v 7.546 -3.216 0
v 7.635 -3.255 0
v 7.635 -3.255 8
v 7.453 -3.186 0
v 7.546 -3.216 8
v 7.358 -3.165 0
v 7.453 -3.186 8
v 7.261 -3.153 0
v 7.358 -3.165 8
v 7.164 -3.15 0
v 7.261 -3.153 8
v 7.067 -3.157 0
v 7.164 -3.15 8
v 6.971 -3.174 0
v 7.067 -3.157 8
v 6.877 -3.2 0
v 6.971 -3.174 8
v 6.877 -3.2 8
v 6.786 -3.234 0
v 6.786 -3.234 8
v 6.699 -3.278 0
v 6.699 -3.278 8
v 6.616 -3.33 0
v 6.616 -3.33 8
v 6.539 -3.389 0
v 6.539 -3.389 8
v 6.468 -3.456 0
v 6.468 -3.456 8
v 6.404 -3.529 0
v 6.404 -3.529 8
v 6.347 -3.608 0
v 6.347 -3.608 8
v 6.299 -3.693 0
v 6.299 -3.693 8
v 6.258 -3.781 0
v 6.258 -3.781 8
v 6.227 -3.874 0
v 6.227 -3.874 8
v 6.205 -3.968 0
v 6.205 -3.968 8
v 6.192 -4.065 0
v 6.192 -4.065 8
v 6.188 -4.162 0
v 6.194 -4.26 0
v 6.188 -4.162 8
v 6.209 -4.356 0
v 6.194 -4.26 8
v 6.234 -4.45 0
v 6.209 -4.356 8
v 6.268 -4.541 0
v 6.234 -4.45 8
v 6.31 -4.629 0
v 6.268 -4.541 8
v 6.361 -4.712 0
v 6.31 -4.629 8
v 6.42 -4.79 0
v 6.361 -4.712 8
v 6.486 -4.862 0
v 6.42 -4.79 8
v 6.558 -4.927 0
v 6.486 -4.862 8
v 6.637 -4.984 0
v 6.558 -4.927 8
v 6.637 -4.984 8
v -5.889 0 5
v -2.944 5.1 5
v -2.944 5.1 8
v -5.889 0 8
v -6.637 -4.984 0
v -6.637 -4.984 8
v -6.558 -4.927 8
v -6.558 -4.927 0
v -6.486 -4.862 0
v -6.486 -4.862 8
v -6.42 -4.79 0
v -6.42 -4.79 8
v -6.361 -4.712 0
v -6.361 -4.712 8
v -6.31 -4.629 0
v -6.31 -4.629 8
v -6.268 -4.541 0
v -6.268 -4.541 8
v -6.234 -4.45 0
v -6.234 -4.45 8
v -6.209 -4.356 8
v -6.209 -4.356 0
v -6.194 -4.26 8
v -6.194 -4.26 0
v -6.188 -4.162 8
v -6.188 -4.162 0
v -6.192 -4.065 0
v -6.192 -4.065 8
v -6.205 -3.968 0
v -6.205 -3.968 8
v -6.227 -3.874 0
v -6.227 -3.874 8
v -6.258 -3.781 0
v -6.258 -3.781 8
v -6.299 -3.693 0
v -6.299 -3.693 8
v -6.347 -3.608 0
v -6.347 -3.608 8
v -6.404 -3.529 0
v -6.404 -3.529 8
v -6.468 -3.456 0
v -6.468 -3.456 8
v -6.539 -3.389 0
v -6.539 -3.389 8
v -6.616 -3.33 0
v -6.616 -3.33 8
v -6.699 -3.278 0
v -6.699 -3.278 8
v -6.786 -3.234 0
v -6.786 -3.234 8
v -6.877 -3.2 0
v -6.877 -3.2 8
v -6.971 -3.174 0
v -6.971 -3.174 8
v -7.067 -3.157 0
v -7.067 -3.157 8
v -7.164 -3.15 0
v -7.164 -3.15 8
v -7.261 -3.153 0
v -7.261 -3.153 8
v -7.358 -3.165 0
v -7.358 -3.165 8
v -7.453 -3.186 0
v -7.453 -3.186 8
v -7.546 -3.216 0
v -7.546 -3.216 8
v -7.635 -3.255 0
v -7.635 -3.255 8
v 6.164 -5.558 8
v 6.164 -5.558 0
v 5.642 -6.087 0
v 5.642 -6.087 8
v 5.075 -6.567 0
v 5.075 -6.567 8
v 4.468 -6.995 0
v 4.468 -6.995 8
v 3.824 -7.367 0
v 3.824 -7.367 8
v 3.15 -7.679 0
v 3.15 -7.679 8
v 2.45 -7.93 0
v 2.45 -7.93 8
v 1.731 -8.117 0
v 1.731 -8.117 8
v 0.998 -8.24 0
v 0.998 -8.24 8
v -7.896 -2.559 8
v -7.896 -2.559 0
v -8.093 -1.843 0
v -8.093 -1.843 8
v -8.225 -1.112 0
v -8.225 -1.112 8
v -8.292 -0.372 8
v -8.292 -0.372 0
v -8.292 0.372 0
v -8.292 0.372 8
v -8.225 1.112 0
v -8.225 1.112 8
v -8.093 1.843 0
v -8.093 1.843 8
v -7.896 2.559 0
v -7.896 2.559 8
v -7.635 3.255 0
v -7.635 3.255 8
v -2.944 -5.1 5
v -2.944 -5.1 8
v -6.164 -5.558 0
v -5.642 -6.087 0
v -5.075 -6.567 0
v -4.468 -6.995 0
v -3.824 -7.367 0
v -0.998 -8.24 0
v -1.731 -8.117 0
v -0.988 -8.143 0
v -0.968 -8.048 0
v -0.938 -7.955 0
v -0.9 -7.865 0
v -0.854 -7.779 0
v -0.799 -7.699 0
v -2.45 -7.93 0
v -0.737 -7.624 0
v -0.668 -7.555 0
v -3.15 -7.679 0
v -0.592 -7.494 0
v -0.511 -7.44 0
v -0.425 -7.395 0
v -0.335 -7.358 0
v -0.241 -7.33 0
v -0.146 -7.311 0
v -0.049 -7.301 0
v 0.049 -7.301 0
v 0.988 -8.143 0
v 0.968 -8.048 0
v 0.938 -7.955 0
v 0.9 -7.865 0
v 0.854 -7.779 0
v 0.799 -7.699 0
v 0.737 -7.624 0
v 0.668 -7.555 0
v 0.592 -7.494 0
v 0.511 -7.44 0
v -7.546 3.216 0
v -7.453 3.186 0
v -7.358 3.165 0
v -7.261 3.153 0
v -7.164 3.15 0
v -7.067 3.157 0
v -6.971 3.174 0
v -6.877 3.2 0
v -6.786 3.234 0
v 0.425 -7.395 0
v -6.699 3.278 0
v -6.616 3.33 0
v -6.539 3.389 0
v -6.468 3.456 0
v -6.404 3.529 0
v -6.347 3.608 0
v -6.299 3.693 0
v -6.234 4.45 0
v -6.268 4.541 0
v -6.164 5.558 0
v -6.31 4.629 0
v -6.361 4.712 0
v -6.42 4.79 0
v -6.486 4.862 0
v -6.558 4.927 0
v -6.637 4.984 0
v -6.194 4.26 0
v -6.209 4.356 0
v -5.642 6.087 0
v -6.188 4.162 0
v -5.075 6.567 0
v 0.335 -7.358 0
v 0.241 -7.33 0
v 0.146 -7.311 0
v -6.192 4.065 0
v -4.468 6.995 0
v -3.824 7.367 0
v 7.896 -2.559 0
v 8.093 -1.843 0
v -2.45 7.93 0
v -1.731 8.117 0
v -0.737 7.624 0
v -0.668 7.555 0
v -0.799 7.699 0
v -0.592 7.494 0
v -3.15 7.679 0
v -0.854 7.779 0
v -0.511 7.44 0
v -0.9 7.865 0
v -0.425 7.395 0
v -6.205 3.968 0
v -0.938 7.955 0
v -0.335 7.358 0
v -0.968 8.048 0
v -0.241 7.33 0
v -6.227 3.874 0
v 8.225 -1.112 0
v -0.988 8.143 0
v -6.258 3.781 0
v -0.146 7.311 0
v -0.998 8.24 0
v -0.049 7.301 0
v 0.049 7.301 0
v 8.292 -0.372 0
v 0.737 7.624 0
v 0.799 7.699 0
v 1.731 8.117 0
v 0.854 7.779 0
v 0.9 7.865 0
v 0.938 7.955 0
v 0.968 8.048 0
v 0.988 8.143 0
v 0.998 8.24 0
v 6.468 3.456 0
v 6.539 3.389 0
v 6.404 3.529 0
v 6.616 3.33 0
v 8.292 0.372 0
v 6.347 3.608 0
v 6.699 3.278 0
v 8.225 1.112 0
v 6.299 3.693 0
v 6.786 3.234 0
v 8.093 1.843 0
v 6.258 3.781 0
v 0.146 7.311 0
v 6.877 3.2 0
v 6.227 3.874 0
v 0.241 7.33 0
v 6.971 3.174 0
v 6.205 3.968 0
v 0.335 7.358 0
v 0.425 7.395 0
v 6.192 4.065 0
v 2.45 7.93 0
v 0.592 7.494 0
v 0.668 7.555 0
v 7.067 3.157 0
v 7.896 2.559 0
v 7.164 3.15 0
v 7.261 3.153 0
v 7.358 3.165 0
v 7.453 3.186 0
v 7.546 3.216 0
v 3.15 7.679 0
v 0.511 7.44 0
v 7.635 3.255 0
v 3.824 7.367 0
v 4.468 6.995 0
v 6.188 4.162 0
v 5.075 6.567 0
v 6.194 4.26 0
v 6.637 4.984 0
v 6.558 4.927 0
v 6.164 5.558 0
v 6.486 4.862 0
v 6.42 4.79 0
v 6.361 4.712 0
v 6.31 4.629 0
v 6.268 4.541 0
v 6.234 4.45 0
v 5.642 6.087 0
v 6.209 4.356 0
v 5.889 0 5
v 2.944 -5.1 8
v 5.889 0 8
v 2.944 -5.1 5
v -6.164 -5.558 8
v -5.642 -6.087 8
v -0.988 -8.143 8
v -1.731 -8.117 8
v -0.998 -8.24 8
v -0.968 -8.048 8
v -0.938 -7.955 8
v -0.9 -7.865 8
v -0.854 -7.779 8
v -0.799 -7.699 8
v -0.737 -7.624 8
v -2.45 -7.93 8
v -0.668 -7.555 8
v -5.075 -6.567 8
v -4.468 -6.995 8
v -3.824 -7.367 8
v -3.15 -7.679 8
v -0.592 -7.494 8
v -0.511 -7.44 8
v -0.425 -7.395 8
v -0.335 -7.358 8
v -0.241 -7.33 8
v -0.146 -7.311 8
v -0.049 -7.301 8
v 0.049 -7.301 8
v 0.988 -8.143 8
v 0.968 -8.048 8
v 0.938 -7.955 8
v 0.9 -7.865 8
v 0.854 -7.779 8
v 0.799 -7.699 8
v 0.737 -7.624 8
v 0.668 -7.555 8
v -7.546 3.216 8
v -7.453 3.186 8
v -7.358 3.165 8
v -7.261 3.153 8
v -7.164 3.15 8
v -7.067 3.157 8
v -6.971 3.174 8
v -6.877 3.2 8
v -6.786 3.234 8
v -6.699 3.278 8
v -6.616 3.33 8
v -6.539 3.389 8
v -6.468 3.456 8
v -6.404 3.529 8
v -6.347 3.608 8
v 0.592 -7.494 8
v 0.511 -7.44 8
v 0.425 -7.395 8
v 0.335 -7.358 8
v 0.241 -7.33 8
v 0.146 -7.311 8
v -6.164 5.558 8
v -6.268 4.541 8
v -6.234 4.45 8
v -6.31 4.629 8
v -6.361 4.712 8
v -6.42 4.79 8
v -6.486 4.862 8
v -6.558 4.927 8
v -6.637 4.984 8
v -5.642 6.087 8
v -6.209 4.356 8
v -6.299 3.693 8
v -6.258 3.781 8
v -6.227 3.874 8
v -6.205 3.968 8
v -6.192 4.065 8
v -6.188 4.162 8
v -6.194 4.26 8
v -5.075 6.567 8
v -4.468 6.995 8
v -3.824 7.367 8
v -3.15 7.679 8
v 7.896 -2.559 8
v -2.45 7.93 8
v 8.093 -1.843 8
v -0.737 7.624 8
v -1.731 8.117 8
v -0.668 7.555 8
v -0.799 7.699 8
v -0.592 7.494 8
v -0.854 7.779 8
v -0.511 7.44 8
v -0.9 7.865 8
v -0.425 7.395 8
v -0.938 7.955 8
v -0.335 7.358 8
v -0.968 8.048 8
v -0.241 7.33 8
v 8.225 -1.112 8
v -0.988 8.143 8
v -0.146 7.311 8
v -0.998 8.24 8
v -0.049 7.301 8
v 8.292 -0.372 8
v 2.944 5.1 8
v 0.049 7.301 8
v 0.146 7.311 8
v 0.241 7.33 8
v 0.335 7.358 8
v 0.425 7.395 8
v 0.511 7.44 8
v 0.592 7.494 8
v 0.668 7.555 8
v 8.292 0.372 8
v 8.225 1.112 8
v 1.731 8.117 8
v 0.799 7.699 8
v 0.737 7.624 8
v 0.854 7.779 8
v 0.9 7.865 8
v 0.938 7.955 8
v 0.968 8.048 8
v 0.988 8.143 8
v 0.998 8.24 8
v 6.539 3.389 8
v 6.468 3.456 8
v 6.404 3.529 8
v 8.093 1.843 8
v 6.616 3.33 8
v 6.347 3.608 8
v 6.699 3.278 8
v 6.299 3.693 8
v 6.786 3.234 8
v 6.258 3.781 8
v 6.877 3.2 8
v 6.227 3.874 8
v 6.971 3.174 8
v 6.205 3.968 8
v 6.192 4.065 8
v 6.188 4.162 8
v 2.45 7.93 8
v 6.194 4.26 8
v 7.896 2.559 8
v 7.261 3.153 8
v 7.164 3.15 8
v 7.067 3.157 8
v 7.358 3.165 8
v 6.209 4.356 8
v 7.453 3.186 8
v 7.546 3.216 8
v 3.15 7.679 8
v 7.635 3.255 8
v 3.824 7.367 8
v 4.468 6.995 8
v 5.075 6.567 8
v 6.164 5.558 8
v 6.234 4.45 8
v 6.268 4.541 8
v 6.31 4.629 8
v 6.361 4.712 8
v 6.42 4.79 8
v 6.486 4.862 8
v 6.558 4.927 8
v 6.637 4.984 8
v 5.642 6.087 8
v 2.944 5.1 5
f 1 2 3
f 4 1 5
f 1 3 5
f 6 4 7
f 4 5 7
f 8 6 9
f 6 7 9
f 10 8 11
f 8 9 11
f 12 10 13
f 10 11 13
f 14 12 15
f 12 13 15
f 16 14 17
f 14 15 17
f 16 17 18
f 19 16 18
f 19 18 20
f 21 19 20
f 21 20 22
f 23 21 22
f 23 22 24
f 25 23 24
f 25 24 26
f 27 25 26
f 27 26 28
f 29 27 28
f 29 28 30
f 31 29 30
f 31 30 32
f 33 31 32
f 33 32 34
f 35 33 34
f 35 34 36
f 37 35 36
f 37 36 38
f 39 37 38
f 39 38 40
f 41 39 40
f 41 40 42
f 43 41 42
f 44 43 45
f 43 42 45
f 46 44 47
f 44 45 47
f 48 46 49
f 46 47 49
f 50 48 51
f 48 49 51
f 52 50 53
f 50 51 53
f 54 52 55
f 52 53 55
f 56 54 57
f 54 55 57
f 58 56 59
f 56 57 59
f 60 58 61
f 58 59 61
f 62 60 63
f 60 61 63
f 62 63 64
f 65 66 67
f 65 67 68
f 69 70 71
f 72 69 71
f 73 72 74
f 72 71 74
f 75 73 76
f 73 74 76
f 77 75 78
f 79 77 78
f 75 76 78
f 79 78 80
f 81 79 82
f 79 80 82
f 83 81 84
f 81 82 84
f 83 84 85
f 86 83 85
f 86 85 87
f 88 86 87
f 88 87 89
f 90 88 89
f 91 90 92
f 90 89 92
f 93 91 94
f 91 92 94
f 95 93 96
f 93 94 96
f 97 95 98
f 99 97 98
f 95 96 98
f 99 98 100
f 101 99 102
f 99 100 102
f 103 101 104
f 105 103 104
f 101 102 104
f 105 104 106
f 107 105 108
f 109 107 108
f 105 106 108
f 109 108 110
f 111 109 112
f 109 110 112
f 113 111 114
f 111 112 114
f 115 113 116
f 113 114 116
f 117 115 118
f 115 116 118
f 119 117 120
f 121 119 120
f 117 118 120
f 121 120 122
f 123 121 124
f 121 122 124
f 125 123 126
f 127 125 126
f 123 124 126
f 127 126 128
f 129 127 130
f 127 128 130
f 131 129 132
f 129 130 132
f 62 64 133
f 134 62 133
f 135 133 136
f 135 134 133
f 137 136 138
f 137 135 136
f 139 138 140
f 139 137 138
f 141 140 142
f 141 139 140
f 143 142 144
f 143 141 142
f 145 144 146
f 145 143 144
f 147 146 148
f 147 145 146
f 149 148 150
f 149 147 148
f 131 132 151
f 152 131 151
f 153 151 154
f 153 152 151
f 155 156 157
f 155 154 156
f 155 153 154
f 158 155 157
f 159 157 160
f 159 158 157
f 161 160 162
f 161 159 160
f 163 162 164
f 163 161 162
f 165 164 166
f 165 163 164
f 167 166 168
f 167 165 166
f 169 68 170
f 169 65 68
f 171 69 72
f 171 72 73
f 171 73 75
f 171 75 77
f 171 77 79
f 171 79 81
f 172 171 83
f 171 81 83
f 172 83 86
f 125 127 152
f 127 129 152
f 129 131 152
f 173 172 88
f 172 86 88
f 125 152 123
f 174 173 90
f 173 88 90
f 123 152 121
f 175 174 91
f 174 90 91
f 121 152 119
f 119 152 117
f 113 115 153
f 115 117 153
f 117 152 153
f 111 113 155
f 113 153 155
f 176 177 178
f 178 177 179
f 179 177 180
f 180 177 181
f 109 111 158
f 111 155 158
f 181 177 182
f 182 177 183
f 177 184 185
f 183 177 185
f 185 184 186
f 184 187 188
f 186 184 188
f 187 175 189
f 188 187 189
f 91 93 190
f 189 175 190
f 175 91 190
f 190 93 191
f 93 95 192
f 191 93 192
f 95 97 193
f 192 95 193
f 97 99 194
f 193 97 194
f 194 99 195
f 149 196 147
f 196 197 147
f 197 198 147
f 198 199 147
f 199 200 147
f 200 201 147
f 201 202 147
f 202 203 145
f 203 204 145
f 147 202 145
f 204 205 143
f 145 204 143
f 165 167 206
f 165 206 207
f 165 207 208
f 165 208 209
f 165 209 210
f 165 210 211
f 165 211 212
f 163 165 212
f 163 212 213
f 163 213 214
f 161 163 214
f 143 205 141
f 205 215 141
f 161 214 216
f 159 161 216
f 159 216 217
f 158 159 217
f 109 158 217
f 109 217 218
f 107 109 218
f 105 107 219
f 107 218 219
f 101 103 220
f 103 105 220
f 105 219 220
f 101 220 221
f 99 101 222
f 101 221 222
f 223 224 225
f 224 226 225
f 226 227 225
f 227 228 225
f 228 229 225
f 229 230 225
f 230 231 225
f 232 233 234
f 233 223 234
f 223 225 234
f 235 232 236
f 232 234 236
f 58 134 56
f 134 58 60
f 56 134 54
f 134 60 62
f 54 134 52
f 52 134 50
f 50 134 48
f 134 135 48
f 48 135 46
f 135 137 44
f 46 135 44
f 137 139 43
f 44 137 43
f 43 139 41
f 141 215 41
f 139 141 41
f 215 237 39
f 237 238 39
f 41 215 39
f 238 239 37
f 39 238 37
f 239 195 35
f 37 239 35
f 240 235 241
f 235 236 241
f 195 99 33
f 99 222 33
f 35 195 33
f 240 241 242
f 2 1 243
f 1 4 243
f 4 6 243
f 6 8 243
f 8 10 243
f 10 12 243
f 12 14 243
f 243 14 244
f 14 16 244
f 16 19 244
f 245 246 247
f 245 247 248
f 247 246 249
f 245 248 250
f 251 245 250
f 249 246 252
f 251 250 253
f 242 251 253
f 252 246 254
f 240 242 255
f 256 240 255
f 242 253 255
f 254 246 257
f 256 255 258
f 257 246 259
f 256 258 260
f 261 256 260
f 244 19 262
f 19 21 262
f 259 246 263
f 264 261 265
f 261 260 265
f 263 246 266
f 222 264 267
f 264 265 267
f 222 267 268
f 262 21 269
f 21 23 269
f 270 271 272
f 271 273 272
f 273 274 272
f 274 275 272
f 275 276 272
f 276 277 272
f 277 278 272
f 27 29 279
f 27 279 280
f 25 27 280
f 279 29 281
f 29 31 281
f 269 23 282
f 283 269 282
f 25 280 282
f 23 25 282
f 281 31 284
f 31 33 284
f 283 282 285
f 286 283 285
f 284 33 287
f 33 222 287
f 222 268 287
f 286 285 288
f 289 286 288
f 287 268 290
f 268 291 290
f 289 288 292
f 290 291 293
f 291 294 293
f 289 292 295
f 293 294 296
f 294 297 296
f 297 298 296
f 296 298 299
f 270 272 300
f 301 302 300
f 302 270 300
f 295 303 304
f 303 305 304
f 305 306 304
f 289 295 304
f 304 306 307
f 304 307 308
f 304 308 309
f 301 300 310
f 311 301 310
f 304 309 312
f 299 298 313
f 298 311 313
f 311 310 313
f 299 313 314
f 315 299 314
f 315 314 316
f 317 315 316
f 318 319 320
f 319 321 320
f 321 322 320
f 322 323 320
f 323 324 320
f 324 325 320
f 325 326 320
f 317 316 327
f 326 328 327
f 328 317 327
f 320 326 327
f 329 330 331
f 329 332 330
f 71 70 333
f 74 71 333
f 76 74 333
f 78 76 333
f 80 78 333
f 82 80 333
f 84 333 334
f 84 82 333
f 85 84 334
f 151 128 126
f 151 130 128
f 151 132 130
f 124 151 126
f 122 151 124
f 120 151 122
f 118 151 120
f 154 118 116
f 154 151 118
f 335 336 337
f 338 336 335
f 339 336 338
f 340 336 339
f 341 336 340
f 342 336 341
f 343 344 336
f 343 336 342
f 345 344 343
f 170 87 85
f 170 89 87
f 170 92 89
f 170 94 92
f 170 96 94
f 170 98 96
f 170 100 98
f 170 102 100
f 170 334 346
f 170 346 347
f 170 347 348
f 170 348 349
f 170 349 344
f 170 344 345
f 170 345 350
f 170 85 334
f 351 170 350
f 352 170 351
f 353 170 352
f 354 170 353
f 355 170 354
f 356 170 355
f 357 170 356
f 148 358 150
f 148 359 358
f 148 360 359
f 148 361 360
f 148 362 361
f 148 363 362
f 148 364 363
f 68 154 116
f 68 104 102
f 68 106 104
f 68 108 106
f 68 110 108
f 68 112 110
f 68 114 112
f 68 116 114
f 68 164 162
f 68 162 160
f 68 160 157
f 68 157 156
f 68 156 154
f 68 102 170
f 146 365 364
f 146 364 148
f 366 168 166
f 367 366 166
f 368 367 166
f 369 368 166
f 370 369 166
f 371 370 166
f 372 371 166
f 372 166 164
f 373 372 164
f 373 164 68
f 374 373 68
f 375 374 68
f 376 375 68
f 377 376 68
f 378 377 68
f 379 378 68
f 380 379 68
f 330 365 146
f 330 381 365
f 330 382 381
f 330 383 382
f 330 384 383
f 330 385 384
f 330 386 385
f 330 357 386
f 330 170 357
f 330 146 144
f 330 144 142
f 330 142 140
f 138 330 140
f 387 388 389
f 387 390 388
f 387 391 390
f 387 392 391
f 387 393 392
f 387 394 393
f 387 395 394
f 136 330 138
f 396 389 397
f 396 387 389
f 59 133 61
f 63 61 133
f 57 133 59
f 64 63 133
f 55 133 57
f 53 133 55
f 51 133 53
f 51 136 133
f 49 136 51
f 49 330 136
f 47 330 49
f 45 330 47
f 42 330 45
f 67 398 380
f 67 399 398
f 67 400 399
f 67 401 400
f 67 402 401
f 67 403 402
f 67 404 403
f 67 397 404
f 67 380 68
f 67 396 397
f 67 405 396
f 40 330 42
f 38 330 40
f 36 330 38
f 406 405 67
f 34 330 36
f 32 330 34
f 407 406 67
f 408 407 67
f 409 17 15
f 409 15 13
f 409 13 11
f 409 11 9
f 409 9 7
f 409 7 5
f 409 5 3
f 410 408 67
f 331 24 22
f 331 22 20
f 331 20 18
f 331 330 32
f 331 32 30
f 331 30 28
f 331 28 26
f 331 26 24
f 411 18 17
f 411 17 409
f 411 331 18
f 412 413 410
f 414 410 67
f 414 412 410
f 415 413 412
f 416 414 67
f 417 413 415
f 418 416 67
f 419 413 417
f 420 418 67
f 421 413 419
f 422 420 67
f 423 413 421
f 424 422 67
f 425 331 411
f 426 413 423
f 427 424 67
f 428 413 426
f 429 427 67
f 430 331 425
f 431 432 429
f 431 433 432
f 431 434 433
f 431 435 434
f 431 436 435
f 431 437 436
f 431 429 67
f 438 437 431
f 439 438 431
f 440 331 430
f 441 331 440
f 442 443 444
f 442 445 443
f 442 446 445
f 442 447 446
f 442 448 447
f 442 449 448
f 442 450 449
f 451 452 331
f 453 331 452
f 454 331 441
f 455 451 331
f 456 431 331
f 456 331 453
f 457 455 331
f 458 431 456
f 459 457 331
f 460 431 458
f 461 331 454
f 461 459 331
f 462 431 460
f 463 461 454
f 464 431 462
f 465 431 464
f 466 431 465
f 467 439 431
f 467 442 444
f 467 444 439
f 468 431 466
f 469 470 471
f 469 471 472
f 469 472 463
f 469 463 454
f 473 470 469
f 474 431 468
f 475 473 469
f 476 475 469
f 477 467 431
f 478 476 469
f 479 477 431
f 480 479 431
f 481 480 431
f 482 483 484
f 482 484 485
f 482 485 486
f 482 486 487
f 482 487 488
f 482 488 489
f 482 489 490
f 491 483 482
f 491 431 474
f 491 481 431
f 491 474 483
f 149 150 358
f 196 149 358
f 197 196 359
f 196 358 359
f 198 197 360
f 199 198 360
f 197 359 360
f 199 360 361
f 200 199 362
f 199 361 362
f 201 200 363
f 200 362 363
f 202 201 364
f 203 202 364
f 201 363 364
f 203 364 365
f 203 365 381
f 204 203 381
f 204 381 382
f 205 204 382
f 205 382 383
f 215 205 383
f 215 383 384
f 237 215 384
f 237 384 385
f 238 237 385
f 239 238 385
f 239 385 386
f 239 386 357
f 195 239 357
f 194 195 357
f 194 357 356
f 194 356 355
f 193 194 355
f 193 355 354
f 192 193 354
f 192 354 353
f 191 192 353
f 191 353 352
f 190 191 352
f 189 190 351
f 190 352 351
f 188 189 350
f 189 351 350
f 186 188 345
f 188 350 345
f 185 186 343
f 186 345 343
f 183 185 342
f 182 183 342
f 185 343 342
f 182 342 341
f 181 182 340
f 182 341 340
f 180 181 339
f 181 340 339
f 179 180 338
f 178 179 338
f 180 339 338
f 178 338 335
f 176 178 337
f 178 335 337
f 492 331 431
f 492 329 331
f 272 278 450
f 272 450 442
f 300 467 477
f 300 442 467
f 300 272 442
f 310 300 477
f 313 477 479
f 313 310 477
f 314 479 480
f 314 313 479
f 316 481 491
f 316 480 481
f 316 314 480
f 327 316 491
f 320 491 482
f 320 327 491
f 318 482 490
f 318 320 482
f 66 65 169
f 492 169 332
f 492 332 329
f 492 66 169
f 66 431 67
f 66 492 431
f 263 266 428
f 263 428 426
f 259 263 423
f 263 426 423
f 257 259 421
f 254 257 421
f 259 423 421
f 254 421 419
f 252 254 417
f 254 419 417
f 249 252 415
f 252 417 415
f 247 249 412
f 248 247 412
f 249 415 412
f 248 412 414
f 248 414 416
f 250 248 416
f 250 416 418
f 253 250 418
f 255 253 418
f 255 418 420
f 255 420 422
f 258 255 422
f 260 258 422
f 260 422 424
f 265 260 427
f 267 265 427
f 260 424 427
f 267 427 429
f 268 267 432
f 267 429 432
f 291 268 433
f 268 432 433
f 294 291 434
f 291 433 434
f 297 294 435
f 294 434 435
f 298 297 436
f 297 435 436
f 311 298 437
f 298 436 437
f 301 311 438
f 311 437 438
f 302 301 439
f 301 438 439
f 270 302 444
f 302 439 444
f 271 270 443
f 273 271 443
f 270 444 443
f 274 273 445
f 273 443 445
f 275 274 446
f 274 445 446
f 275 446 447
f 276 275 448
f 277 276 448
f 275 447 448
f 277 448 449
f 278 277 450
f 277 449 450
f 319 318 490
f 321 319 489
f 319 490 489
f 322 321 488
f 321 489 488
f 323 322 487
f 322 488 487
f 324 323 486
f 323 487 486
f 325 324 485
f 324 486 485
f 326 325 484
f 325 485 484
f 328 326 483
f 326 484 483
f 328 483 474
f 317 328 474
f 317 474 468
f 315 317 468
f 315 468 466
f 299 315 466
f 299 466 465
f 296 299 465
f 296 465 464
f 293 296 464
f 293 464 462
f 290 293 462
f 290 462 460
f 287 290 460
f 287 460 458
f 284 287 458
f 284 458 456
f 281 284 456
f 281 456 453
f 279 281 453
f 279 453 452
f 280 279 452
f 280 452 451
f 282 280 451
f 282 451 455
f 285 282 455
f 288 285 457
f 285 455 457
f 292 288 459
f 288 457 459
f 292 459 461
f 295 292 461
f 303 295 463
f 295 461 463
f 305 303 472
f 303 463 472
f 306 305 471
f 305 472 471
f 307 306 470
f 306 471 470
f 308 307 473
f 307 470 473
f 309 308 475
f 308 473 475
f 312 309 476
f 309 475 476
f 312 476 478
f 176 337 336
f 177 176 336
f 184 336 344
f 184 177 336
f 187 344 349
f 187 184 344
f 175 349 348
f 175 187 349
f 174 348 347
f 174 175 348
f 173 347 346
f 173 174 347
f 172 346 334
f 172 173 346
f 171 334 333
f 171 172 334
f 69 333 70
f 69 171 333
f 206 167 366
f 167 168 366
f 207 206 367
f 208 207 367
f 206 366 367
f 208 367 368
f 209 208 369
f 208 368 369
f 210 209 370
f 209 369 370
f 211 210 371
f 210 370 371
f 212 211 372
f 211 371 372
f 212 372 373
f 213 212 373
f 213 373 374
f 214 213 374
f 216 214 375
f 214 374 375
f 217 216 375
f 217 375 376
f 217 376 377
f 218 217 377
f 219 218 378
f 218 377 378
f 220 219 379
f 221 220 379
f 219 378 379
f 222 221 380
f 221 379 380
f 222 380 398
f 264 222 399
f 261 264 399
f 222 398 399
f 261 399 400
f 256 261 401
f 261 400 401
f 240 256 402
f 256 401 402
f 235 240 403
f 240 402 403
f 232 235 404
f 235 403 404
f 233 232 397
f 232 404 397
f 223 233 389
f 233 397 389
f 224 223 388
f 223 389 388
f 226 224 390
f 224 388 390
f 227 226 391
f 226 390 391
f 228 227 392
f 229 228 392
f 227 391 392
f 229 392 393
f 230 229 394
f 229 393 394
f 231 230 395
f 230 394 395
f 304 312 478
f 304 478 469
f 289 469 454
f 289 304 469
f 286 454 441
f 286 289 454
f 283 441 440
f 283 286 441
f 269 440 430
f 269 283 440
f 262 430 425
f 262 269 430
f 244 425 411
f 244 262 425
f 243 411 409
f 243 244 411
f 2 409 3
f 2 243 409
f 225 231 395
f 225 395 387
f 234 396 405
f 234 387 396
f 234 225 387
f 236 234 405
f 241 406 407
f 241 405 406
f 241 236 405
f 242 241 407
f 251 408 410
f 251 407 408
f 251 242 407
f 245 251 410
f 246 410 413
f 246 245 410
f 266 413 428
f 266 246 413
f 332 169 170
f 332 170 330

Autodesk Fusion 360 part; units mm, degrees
sketch "Boceto1" plane through (0, 0, 0) normal (0, 0, 1) x (1, 0, 0)
  line L0 (2.9445, -5.1) -> (5.889, 0)
  line L1 (5.889, 0) -> (2.9445, 5.1)
  line L2 (2.9445, 5.1) -> (-2.9445, 5.1)
  line L3 (-2.9445, 5.1) -> (-5.889, 0)
  line L4 (-5.889, 0) -> (-2.9445, -5.1)
  line L5 (-2.9445, -5.1) -> (2.9445, -5.1)
  circle A0 centre (0, 0) radius 8.3
  dimension "d1" = 5.1
  dimension "d2" = 16.6
extrude "Extruir1" add sketch "Boceto1" along normal blind 8
extrude "Extruir2" add sketch "Boceto1" along normal blind 5 contours L0 L1 L2 L3 L4 L5
sketch "Boceto2" plane through (0, 0, 8) normal (0, 0, 1) x (-1, 0, 0)
  line L0 (-2.9445, 5.1) -> (2.9445, 5.1)
  line L1 (2.9445, 5.1) -> (5.889, 0)
  line L2 (5.889, 0) -> (2.9445, -5.1)
  line L3 (2.9445, -5.1) -> (-2.9445, -5.1)
  line L4 (-2.9445, -5.1) -> (-5.889, 0)
  line L5 (-5.889, 0) -> (-2.9445, 5.1)
  circle A0 centre (0, 0) radius 8.3
  circle A1 centre (0, -8.3) radius 1
  line L6 (0, 0) -> (0, -10.2342) construction
  circle A2 centre (7.188, -4.15) radius 1
  circle A3 centre (7.188, 4.15) radius 1
  circle A4 centre (0, 8.3) radius 1
  circle A5 centre (-7.188, 4.15) radius 1
  circle A6 centre (-7.188, -4.15) radius 1
  dimension "d7" = 2
  dimension "d9" = 360
extrude "Extruir3" cut sketch "Boceto2" against normal blind 8 contours A0 A3 | A0 A2 | A0 A4 | A0 A1 | A0 A5 | A0 A6 picked at (6.8842, 4.0023) picked at (6.8842, -4.0023) picked at (-0.024, 7.9631) picked at (-0.024, -7.9631) picked at (-6.9055, 3.9648) picked at (-6.9055, -3.9648)
